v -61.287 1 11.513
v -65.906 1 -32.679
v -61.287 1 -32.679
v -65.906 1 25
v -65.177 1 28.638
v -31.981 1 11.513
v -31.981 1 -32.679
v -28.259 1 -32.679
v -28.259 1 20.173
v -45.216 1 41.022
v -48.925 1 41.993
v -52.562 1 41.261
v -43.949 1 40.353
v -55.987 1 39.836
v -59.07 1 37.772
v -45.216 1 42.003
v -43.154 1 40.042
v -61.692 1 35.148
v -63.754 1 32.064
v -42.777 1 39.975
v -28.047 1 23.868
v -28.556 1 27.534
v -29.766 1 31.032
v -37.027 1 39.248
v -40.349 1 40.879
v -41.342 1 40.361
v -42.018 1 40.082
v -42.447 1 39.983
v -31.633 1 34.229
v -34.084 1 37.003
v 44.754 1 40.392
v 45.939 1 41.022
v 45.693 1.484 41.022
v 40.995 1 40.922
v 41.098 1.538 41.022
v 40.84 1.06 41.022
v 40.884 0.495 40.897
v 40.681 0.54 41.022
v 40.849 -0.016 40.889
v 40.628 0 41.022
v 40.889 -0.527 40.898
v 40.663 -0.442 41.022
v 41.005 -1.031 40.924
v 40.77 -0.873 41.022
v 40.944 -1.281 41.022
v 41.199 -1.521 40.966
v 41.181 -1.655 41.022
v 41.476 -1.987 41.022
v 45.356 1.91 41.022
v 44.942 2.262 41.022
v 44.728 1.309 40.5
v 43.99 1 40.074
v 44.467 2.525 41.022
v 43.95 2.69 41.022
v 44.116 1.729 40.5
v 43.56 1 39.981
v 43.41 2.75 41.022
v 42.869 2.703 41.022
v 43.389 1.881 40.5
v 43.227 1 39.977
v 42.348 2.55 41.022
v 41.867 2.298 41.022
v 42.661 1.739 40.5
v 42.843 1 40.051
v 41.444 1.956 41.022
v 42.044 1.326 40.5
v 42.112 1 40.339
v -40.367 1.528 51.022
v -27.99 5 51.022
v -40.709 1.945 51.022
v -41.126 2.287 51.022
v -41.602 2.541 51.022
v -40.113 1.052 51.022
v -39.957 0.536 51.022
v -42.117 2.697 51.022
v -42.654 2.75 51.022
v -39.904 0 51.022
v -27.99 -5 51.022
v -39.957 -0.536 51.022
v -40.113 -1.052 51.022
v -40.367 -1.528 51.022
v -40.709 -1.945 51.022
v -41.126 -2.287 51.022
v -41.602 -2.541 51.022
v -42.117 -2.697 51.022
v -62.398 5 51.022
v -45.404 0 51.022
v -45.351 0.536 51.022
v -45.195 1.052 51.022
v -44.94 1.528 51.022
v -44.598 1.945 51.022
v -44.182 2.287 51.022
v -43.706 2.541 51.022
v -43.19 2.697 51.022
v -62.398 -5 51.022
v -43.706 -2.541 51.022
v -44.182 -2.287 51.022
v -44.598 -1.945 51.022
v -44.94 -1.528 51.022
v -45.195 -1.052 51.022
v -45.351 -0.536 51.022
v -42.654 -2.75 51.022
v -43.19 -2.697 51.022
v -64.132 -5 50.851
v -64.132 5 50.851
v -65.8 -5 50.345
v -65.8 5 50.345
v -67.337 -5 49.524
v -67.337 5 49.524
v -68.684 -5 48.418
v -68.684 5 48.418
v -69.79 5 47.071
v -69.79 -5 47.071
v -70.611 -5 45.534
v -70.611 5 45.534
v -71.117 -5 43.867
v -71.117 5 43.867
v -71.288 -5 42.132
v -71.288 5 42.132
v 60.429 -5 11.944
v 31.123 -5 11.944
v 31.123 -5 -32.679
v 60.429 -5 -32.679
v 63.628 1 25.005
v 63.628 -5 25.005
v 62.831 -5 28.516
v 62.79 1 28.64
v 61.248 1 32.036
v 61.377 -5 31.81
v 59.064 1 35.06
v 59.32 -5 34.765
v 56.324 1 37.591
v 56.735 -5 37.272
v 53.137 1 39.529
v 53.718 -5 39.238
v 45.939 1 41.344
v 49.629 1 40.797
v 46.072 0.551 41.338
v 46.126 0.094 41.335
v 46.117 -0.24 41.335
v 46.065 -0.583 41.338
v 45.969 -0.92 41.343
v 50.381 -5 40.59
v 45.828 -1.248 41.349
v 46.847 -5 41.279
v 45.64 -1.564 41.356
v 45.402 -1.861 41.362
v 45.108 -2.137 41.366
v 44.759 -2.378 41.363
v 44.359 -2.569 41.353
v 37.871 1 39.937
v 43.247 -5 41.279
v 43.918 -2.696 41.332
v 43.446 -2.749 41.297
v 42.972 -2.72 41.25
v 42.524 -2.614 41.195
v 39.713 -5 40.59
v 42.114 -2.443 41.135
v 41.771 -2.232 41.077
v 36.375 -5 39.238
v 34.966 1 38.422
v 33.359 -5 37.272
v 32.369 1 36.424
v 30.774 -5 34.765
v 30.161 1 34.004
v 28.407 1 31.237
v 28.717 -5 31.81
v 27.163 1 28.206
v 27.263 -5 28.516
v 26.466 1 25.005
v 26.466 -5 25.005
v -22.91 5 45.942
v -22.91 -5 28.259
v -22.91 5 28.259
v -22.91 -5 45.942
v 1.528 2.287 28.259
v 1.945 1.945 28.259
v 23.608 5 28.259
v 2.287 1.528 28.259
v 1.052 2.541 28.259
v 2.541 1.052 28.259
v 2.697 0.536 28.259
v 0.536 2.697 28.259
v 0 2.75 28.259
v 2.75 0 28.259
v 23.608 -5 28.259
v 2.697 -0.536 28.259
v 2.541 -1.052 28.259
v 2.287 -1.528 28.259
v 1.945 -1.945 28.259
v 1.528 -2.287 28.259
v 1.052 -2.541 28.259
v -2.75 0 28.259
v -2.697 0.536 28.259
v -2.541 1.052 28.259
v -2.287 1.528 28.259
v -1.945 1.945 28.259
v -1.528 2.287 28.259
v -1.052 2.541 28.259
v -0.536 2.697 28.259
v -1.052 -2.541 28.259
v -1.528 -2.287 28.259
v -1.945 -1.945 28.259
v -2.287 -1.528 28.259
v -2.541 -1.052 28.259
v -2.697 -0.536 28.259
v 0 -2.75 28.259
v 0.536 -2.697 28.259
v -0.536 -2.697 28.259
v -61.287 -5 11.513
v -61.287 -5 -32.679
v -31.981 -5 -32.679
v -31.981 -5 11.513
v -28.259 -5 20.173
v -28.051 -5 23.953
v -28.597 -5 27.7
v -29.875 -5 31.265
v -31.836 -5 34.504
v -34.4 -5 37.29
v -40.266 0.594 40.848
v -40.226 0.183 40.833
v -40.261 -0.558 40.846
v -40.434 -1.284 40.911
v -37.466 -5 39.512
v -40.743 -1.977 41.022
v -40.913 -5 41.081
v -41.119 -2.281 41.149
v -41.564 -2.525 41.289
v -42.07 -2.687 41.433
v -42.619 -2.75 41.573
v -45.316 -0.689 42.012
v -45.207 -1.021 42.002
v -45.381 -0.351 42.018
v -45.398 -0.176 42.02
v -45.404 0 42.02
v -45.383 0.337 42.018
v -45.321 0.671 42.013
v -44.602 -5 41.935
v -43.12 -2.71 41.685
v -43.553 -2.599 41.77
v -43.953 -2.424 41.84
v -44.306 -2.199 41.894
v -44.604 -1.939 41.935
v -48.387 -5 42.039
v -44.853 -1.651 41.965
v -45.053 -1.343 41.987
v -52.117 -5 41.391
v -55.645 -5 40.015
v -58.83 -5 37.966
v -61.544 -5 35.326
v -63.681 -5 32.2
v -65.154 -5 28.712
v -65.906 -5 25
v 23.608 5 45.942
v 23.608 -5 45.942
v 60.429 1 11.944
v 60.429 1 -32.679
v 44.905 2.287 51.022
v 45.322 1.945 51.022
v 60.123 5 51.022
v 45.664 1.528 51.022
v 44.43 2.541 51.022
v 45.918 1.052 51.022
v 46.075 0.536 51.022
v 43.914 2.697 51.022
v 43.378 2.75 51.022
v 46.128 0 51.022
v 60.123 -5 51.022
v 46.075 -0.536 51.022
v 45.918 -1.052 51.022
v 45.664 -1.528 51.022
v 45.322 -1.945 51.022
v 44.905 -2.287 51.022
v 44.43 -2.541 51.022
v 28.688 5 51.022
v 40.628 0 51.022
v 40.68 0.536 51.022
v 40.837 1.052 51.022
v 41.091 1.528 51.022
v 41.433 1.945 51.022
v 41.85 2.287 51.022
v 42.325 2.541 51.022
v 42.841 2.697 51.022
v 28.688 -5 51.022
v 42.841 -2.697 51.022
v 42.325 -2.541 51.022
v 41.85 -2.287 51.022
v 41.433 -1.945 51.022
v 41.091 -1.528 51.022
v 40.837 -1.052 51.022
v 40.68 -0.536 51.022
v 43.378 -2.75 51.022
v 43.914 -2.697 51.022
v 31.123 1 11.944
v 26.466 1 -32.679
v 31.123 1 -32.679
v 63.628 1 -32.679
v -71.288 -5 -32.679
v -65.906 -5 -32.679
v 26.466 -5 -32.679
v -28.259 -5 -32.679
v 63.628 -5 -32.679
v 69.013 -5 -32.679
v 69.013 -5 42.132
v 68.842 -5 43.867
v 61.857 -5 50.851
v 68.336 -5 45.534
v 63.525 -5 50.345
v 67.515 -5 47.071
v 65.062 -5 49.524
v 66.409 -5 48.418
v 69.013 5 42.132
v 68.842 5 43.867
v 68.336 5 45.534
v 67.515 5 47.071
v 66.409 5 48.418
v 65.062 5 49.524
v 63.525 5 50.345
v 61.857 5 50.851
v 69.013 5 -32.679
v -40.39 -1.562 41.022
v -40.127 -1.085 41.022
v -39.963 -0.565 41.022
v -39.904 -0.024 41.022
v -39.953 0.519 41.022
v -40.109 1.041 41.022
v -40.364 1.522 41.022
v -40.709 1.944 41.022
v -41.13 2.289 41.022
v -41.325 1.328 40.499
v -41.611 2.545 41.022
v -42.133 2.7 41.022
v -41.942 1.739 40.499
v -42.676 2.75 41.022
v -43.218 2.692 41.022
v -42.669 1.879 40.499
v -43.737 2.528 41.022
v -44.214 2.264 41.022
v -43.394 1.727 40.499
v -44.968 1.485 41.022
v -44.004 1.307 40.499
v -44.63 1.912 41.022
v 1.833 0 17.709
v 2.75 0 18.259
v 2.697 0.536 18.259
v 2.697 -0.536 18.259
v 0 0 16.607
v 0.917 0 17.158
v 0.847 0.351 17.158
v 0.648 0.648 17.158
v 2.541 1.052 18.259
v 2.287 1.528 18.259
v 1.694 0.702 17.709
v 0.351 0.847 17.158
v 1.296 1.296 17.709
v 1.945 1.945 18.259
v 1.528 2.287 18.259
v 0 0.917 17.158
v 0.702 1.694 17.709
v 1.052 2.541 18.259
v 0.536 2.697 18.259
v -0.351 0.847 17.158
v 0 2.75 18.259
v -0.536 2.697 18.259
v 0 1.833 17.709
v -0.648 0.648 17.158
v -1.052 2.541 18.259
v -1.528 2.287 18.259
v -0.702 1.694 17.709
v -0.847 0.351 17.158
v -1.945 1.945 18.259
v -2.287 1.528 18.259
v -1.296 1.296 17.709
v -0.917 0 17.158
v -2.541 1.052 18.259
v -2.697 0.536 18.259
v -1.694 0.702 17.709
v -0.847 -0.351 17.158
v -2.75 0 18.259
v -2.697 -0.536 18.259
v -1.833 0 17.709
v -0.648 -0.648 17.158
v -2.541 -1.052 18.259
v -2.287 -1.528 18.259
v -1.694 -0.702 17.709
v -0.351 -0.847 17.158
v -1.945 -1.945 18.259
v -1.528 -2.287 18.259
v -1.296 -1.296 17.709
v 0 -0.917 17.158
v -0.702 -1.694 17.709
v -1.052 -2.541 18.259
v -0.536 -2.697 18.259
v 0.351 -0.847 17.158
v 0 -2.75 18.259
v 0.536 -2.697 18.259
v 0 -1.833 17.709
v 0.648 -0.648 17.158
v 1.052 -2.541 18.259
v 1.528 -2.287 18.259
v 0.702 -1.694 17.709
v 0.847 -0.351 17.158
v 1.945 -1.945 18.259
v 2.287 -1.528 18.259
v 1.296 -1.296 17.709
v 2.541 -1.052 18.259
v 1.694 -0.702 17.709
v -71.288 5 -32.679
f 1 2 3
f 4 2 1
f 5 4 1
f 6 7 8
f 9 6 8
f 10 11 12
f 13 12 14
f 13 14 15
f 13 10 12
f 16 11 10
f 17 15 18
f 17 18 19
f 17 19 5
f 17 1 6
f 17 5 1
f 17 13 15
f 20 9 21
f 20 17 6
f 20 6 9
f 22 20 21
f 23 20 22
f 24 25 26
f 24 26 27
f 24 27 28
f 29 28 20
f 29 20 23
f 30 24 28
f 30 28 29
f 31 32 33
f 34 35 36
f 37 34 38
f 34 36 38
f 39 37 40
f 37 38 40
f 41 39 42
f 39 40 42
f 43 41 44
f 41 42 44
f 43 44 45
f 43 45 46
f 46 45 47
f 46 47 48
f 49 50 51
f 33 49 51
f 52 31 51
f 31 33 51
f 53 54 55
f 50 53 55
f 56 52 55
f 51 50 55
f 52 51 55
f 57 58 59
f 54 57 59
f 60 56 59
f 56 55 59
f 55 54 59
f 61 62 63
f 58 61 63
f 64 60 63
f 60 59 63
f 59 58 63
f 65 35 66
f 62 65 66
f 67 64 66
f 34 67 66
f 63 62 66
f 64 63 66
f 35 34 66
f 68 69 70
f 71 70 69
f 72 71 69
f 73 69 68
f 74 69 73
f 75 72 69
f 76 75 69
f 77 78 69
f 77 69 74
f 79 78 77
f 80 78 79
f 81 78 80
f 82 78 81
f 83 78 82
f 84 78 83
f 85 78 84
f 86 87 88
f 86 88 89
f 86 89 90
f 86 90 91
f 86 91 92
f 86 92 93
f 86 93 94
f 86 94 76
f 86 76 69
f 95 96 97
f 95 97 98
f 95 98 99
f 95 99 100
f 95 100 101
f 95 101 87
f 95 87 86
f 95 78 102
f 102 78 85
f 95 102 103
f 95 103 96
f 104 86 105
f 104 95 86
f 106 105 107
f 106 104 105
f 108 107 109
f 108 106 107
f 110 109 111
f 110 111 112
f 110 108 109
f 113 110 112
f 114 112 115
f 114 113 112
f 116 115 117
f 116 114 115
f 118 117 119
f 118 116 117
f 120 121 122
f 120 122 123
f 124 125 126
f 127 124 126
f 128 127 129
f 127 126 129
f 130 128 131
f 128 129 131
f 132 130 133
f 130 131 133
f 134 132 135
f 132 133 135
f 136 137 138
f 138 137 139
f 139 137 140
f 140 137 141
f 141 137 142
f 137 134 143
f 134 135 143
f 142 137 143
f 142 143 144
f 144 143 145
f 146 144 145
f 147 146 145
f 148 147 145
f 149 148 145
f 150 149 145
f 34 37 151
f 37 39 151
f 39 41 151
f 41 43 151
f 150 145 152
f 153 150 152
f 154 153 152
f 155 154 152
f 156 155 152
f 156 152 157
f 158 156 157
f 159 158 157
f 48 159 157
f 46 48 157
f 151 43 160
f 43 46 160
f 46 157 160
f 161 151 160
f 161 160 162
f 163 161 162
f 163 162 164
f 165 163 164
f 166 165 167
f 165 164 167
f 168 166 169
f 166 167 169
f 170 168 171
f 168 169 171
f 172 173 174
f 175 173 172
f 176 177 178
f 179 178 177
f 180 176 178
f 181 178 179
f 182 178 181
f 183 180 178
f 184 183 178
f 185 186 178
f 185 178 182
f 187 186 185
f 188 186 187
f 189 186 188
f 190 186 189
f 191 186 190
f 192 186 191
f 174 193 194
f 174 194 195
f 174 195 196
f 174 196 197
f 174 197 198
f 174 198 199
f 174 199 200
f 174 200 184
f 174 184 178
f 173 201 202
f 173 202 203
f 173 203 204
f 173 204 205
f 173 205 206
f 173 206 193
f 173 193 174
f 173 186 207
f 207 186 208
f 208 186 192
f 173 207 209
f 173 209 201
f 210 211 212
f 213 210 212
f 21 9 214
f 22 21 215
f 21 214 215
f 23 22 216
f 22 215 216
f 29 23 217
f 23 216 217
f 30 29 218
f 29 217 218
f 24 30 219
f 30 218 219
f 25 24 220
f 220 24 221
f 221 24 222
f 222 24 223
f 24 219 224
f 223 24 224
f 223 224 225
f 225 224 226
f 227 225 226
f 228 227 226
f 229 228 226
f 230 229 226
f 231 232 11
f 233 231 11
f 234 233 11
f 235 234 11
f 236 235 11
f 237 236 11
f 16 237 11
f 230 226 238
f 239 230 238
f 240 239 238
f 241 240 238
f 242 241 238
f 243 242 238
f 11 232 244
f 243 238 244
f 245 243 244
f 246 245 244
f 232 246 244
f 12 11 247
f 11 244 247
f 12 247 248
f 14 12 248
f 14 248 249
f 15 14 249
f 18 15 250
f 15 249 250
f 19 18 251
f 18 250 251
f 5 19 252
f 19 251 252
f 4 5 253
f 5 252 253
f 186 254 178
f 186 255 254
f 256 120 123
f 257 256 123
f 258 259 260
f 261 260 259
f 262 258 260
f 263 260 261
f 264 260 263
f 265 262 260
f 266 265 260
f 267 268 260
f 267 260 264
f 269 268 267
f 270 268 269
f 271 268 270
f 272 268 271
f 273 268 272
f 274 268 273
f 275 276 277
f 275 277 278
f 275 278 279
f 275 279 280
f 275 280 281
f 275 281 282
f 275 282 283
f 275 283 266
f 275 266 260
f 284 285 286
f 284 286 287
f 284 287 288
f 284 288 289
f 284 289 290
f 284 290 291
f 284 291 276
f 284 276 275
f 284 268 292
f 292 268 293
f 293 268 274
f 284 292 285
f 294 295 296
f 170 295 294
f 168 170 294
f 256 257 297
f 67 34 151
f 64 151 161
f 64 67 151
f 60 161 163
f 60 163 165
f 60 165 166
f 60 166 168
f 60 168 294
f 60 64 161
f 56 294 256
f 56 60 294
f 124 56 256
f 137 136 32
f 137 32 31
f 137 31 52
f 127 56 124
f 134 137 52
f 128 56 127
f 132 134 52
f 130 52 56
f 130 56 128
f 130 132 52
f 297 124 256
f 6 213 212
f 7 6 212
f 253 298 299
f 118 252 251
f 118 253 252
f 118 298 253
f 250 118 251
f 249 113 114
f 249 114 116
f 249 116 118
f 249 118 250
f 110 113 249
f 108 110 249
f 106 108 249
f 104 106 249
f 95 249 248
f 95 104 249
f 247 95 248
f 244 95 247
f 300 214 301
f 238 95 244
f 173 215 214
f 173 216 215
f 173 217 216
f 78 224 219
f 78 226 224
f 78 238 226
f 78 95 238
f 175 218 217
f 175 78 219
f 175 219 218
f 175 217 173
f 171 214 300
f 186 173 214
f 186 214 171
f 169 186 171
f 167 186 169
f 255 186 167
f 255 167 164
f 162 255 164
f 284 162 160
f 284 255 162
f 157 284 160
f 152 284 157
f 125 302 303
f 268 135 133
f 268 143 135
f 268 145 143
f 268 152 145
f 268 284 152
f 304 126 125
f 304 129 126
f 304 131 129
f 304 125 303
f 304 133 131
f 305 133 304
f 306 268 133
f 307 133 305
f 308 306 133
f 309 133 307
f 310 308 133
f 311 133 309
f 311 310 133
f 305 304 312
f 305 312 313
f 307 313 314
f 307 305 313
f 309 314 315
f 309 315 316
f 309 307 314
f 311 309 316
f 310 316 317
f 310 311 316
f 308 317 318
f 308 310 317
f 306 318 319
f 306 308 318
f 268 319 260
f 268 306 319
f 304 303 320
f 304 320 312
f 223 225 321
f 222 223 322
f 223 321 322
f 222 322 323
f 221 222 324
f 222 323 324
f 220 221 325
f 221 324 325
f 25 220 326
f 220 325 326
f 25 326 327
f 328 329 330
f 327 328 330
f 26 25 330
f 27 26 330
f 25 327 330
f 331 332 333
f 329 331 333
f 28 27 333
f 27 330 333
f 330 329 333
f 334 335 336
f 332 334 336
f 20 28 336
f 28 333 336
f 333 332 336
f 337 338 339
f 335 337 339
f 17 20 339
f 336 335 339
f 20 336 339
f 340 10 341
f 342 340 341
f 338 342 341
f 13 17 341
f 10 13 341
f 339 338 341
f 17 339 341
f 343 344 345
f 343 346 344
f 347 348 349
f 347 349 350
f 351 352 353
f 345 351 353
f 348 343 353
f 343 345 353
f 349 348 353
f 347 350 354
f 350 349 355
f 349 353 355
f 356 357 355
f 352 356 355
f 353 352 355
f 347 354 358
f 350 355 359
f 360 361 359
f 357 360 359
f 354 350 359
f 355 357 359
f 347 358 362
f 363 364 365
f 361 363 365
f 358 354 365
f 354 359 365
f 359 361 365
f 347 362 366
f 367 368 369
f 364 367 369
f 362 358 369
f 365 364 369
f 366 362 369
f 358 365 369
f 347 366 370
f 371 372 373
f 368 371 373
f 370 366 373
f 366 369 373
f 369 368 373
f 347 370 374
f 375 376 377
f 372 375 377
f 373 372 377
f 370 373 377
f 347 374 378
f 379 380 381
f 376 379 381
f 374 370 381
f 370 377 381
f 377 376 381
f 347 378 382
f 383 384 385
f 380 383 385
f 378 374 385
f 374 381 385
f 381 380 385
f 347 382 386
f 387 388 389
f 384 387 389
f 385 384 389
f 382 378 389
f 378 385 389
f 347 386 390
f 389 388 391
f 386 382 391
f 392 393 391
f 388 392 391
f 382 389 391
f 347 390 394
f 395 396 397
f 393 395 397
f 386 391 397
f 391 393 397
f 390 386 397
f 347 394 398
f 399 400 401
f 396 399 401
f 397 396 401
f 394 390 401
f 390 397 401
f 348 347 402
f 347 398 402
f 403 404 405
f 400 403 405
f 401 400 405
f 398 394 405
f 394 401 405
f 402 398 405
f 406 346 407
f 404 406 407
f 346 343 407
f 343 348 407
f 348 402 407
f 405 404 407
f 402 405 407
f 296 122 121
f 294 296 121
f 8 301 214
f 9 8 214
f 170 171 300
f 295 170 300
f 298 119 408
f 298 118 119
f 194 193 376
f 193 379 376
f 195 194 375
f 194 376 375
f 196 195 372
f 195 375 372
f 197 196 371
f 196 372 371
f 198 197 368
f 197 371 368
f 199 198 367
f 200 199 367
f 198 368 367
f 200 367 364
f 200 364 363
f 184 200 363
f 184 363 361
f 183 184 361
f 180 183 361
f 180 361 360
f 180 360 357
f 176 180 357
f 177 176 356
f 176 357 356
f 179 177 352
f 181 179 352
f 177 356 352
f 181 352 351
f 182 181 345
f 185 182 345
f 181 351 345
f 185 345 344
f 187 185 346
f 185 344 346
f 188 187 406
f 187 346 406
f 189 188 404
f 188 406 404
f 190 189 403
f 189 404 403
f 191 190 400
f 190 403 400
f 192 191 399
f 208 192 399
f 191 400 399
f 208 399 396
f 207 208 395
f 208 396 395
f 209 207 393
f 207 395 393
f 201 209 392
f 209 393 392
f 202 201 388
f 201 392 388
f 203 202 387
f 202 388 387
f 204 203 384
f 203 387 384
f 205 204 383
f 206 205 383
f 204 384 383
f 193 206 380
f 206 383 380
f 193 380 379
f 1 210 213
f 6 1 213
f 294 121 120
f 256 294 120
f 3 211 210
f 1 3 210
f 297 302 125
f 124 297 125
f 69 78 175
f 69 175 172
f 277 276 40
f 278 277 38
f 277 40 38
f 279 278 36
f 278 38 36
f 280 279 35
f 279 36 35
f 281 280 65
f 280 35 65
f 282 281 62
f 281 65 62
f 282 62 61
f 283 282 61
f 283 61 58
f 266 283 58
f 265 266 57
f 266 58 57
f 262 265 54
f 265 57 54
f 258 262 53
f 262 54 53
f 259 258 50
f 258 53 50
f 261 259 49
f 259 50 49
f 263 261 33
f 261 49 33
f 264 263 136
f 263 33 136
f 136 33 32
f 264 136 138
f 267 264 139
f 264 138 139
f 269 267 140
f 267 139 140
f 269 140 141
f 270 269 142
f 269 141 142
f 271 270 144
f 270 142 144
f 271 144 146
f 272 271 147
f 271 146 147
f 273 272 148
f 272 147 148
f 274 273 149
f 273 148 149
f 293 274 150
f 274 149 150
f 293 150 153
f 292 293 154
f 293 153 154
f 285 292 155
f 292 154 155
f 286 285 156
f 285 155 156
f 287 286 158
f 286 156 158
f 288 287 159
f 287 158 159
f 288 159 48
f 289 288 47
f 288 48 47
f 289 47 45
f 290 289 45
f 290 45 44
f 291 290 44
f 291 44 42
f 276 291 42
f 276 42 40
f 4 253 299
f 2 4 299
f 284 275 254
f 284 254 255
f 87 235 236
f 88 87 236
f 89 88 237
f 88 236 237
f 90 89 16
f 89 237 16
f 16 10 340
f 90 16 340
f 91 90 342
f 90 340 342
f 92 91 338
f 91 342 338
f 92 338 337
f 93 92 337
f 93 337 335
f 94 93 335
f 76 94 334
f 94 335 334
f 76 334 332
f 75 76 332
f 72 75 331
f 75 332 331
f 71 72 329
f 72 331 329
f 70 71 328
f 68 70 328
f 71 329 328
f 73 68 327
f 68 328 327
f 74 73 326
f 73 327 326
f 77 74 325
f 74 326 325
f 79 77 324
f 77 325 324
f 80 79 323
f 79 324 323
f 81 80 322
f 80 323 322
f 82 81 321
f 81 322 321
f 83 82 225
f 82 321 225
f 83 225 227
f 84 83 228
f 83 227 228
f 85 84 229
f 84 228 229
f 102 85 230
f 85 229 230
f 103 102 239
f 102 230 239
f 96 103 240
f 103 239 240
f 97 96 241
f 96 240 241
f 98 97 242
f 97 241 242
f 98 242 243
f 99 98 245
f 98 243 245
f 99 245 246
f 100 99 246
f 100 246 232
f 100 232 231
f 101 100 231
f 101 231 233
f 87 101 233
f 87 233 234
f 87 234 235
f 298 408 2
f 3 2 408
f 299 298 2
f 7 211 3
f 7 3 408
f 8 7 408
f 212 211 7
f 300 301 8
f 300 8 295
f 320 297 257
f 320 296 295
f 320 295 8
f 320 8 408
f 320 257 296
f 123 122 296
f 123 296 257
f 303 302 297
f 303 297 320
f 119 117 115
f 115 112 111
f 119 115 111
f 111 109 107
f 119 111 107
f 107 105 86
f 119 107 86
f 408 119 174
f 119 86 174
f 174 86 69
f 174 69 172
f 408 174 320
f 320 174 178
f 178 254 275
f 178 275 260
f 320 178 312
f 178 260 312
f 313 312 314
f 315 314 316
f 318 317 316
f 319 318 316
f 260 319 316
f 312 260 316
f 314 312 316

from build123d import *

# Parameters (mm, degrees)
F1_DEPTH  = 5
F4_D      = 5.5
F4_DEPTH  = 10
F4_TIP    = 1.6523667023
F5_D      = 5.5
F5_DEPTH  = 10
F5_TIP    = 1.6523667023
F7_D      = 5.5
F7_DEPTH  = 10
F7_TIP    = 1.6523667023
F9_DEPTH  = 6
F11_DEPTH = 6
F12_SIZE  = 5.08
F13_SIZE  = 5.08


with BuildPart() as f1:
    # F0 (on Front) → F1 (new body, symmetric)
    with BuildSketch(Plane.XZ):
        with BuildLine():
            Line((-71.2879747152, 42.1321982205), (-71.2879747152, 28.2593462616))
            Line((-71.2879747152, 28.2593462616), (-22.9098405689, 28.2593462616))
            Line((-22.9098405689, 28.2593462616), (-22.9098405689, 51.0221982205))
            Line((-22.9098405689, 51.0221982205), (-62.3979747152, 51.0221982205))
            ThreePointArc((-62.3979747152, 51.0221982205), (-68.684154, 48.4183775052), (-71.2879747152, 42.1321982205))
        make_face()
        Polygon((-22.9098405689, 28.2593462616), (-71.2879747152, 28.2593462616), (-71.2879747152, -32.6785035431), (69.0129896845, -32.6785035431), (69.0129896845, 28.2593462616), (23.607602343, 28.2593462616), align=None)
        with BuildLine():
            Line((23.607602343, 51.0221982205), (23.607602343, 28.2593462616))
            Line((23.607602343, 28.2593462616), (69.0129896845, 28.2593462616))
            Line((69.0129896845, 28.2593462616), (69.0129896845, 42.1321982205))
            ThreePointArc((69.0129896845, 42.1321982205), (66.4091689693, 48.4183775052), (60.1229896845, 51.0221982205))
            Line((60.1229896845, 51.0221982205), (23.607602343, 51.0221982205))
        make_face()
    extrude(amount=F1_DEPTH, both=True)

    # F4
    with Locations(Plane.XY.offset(51.0221982205)):
        with Locations((-42.6539076421, 0)):
            Hole(F4_D / 2, depth=F4_DEPTH)
            with Locations((0, 0, -(F4_DEPTH + F4_TIP / 2))):  # 118° drill point
                Cone(0, F4_D / 2, F4_TIP, mode=Mode.SUBTRACT)

    # F5
    with Locations(Plane.XY.offset(51.0221982205)):
        with Locations((43.3775149286, 0)):
            Hole(F5_D / 2, depth=F5_DEPTH)
            with Locations((0, 0, -(F5_DEPTH + F5_TIP / 2))):  # 118° drill point
                Cone(0, F5_D / 2, F5_TIP, mode=Mode.SUBTRACT)

    # F7
    with Locations(Plane.XY.offset(28.2593462616)):
        with Locations((0, 0)):
            Hole(F7_D / 2, depth=F7_DEPTH)
            with Locations((0, 0, -(F7_DEPTH + F7_TIP / 2))):  # 118° drill point
                Cone(0, F7_D / 2, F7_TIP, mode=Mode.SUBTRACT)

    # F8 (on face) → F9 (cut)
    with BuildSketch(Plane.XZ.offset(5)):
        with BuildLine():
            Line((-28.2593462616, 25.0004206035), (-28.2593462616, 20.1726239209))
            ThreePointArc((-28.2593462616, 20.1726239209), (-44.6016580305, 41.9345797557), (-65.9063084503, 25.0004206035))
            Line((-65.9063084503, 25.0004206035), (-28.2593462616, 25.0004206035))
        make_face()
        Polygon((-28.2593462616, -32.6785035431), (-28.2593462616, 20.1726239209), (-28.2593462616, 25.0004206035), (-65.9063084503, 25.0004206035), (-65.9063084503, 21.2075540823), (-65.9063084503, -32.6785035431), (-61.2867288291, -32.6785035431), (-61.2867288291, 11.5130664781), (-31.9807417691, 11.5130664781), (-31.9807417691, -32.6785035431), align=None)
    extrude(amount=-F9_DEPTH, mode=Mode.SUBTRACT)

    # F10 (on face) → F11 (cut)
    with BuildSketch(Plane.XZ.offset(5)):
        with BuildLine():
            Line((26.4657004472, 25.0048964569), (63.6281896845, 25.0048964569))
            ThreePointArc((63.6281896845, 25.0048964569), (45.0469450659, 41.3656967057), (26.4657004472, 25.0048964569))
        make_face()
        Polygon((63.6281896845, -32.6785035431), (63.6281896845, 25.0048964569), (26.4657004472, 25.0048964569), (26.4657004472, 20.2626549029), (26.4657004472, -32.6785035431), (31.1232465006, -32.6785035431), (31.1232465006, 11.9440579109), (60.4292335607, 11.9440579109), (60.4292335607, -32.6785035431), align=None)
    extrude(amount=-F11_DEPTH, mode=Mode.SUBTRACT)

    # F12
    f12_edges = [f1.edges().sort_by_distance(p)[0] for p in [
        (-22.909841, 0, 51.022198),
    ]]
    chamfer(f12_edges, length=F12_SIZE)

    # F13
    f13_edges = [f1.edges().sort_by_distance(p)[0] for p in [
        (23.607602, 0, 51.022198),
    ]]
    chamfer(f13_edges, length=F13_SIZE)


solid = f1.part
